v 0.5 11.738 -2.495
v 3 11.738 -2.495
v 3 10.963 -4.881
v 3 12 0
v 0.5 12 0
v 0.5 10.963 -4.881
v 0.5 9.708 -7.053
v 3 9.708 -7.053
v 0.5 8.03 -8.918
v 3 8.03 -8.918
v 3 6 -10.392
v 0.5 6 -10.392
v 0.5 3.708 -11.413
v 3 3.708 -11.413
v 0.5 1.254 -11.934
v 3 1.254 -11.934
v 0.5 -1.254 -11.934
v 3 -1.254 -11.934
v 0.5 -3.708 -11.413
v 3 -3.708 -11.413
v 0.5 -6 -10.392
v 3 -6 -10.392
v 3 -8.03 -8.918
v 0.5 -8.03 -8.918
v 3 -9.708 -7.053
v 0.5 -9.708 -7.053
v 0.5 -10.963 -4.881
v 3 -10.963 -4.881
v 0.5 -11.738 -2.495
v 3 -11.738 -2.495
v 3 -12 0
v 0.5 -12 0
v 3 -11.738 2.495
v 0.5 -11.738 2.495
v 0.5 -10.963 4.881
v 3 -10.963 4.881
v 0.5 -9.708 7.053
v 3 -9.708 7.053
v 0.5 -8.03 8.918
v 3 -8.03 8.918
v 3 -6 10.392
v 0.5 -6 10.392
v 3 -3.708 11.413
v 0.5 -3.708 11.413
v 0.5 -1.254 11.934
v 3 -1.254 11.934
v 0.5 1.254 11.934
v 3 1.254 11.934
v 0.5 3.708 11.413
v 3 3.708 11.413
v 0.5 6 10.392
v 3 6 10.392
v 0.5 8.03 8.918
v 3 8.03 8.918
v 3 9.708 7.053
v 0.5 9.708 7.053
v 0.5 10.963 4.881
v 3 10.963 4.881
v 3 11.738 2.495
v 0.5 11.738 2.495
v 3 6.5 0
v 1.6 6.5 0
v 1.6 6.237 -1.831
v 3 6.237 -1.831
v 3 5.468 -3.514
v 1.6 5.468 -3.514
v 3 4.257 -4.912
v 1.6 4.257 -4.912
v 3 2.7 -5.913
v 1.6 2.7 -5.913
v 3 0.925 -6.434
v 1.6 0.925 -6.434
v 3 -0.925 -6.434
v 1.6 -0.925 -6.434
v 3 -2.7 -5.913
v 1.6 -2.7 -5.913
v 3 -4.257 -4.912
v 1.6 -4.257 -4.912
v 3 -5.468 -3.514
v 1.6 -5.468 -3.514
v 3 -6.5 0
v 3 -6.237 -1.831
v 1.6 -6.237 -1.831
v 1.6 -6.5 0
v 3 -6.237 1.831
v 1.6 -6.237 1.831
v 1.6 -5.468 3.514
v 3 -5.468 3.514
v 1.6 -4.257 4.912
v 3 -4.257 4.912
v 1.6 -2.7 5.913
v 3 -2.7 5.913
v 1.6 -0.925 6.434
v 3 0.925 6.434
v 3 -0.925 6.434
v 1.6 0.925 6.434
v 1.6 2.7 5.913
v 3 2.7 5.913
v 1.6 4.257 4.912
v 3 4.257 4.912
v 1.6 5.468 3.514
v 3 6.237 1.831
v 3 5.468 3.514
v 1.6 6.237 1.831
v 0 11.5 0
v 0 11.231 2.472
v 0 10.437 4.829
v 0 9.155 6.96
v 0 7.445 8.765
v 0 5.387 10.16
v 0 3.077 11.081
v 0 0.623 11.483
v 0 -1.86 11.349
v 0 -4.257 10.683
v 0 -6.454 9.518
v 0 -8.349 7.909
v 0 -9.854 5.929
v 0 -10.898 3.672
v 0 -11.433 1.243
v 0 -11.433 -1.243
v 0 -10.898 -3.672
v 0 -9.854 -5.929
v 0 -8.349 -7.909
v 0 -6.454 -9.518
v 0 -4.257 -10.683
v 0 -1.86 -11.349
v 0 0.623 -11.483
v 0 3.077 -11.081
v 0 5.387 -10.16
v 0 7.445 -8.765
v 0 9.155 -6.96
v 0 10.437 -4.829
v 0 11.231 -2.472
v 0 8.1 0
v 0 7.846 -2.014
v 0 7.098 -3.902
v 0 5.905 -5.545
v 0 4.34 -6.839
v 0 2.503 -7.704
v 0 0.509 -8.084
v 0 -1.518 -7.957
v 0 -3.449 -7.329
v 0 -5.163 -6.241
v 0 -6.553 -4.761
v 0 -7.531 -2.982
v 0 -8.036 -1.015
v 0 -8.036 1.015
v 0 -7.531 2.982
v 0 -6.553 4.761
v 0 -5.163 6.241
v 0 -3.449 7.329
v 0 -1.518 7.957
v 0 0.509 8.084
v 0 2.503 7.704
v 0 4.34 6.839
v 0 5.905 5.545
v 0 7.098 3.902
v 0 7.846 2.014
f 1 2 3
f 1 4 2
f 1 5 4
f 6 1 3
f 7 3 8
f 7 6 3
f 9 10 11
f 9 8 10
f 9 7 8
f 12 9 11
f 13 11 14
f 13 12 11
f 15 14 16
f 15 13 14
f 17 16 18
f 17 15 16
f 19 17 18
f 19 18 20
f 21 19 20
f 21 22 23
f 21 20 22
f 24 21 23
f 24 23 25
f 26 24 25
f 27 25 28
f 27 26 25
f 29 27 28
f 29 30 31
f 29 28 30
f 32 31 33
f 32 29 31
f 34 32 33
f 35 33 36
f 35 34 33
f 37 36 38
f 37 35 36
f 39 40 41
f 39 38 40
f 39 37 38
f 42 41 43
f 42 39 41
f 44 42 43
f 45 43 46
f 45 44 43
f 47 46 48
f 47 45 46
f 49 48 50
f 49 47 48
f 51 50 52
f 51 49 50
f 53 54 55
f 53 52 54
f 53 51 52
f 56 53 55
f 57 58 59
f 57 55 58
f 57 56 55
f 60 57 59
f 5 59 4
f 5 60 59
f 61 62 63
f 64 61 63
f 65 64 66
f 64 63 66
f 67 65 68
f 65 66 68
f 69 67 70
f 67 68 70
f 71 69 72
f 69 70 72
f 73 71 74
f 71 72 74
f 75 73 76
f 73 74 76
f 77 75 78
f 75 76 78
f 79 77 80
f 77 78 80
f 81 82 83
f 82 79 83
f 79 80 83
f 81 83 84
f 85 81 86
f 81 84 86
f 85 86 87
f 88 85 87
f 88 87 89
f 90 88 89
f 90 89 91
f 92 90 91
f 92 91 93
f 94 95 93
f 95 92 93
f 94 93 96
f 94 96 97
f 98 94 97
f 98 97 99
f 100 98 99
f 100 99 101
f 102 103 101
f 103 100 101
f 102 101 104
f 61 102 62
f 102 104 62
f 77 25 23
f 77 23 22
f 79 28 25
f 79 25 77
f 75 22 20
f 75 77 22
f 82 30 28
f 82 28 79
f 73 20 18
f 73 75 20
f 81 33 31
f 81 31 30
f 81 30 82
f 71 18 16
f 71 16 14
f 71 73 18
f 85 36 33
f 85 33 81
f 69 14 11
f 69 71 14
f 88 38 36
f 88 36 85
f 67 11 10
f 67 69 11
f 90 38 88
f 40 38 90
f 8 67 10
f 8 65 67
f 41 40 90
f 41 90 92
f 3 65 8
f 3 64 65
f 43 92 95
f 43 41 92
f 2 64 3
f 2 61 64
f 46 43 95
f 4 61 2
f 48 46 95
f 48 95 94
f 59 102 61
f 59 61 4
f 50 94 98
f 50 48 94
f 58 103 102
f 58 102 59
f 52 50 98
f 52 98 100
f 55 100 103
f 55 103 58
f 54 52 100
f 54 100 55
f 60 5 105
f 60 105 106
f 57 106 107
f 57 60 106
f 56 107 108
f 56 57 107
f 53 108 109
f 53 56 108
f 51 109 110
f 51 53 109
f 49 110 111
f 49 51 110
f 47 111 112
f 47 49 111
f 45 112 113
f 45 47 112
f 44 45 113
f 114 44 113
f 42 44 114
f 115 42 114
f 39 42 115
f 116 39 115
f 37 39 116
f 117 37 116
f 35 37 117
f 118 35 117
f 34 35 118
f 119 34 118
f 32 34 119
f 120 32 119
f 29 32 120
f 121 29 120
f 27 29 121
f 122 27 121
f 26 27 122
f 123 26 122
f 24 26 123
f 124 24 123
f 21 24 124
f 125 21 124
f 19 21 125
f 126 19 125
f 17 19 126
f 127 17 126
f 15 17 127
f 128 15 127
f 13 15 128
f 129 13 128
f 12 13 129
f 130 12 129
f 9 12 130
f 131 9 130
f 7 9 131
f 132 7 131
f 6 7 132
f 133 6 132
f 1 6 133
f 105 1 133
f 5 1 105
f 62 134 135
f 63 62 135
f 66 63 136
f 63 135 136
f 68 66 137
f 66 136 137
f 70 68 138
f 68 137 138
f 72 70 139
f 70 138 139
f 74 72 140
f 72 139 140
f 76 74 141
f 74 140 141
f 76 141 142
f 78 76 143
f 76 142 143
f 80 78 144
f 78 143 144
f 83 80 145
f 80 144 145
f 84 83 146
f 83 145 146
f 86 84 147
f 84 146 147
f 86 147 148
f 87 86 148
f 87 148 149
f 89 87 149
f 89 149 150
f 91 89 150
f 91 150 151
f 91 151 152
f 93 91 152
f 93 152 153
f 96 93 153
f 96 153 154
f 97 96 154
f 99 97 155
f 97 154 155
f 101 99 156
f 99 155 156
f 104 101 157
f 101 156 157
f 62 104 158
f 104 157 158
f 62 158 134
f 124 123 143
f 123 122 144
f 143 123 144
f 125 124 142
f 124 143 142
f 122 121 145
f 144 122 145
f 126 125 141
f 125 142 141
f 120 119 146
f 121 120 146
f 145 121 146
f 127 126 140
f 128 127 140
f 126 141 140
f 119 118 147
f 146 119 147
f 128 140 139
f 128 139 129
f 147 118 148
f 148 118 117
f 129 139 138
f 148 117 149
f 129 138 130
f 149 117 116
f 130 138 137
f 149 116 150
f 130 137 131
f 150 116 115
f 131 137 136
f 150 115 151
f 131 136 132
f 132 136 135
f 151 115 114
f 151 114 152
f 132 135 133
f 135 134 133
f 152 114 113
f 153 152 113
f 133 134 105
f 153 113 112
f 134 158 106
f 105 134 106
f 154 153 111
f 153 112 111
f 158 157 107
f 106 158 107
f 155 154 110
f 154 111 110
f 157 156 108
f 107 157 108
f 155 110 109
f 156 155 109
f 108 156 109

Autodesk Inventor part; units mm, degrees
ref_plane "YZ Plane" through (0, 0, 0) normal (1, 0, 0) x (0, 1, 0)
ref_plane "XZ Plane" through (0, 0, 0) normal (0, 1, 0) x (-1, 0, 0)
sketch "Skizze" plane through (0, 0, 0) normal (1, 0, 0) x (0, 1, 0)
  circle A0 centre (0, 0) radius 12
  circle A1 centre (0, 0) radius 6.5
  dimension "d0" = 13
  dimension "d1" = 24
extrude "Körper" add sketch "Skizze" along normal blind 3
chamfer "Fase1" distance 0.5 angle 45 1 edges at (0, -12, 0) measured on face at (0, 9.9875, -1.4758)
chamfer "Fase2" distance 1.6 angle 45 1 edges at (0, -6.5, 0) measured on face at (0, 9.659, -1.4359)
ref_plane "Work Plane1" through (0, 0, 0) normal (0, 0, 1) x (1, 0, 0)
equation "\"d0\" = SD1"
equation "\"d1\" = SD2"
equation "\"d2\" = SD"
equation "\"d4\" = PHH"
equation "\"d5\" = FAWI"
equation "\"d10\" = PHH"
equation "\"d6\" = PHH1"
equation "\"d7\" = FAWI1"
equation "\"d11\" = PHH"
equation "\"SD1\" = 13"
equation "\"SD2\" = 24"
equation "\"SD\" = 3"
equation "\"FAWI\" = 45deg"
equation "\"FAWI1\" = 45deg"
equation "\"PHH\" = 0.5"
equation "\"PHH1\" = 1.6"
equation "\"NND\" = 12"
properties part number "DIN 6916 - 13" material "Stahl, weich"
